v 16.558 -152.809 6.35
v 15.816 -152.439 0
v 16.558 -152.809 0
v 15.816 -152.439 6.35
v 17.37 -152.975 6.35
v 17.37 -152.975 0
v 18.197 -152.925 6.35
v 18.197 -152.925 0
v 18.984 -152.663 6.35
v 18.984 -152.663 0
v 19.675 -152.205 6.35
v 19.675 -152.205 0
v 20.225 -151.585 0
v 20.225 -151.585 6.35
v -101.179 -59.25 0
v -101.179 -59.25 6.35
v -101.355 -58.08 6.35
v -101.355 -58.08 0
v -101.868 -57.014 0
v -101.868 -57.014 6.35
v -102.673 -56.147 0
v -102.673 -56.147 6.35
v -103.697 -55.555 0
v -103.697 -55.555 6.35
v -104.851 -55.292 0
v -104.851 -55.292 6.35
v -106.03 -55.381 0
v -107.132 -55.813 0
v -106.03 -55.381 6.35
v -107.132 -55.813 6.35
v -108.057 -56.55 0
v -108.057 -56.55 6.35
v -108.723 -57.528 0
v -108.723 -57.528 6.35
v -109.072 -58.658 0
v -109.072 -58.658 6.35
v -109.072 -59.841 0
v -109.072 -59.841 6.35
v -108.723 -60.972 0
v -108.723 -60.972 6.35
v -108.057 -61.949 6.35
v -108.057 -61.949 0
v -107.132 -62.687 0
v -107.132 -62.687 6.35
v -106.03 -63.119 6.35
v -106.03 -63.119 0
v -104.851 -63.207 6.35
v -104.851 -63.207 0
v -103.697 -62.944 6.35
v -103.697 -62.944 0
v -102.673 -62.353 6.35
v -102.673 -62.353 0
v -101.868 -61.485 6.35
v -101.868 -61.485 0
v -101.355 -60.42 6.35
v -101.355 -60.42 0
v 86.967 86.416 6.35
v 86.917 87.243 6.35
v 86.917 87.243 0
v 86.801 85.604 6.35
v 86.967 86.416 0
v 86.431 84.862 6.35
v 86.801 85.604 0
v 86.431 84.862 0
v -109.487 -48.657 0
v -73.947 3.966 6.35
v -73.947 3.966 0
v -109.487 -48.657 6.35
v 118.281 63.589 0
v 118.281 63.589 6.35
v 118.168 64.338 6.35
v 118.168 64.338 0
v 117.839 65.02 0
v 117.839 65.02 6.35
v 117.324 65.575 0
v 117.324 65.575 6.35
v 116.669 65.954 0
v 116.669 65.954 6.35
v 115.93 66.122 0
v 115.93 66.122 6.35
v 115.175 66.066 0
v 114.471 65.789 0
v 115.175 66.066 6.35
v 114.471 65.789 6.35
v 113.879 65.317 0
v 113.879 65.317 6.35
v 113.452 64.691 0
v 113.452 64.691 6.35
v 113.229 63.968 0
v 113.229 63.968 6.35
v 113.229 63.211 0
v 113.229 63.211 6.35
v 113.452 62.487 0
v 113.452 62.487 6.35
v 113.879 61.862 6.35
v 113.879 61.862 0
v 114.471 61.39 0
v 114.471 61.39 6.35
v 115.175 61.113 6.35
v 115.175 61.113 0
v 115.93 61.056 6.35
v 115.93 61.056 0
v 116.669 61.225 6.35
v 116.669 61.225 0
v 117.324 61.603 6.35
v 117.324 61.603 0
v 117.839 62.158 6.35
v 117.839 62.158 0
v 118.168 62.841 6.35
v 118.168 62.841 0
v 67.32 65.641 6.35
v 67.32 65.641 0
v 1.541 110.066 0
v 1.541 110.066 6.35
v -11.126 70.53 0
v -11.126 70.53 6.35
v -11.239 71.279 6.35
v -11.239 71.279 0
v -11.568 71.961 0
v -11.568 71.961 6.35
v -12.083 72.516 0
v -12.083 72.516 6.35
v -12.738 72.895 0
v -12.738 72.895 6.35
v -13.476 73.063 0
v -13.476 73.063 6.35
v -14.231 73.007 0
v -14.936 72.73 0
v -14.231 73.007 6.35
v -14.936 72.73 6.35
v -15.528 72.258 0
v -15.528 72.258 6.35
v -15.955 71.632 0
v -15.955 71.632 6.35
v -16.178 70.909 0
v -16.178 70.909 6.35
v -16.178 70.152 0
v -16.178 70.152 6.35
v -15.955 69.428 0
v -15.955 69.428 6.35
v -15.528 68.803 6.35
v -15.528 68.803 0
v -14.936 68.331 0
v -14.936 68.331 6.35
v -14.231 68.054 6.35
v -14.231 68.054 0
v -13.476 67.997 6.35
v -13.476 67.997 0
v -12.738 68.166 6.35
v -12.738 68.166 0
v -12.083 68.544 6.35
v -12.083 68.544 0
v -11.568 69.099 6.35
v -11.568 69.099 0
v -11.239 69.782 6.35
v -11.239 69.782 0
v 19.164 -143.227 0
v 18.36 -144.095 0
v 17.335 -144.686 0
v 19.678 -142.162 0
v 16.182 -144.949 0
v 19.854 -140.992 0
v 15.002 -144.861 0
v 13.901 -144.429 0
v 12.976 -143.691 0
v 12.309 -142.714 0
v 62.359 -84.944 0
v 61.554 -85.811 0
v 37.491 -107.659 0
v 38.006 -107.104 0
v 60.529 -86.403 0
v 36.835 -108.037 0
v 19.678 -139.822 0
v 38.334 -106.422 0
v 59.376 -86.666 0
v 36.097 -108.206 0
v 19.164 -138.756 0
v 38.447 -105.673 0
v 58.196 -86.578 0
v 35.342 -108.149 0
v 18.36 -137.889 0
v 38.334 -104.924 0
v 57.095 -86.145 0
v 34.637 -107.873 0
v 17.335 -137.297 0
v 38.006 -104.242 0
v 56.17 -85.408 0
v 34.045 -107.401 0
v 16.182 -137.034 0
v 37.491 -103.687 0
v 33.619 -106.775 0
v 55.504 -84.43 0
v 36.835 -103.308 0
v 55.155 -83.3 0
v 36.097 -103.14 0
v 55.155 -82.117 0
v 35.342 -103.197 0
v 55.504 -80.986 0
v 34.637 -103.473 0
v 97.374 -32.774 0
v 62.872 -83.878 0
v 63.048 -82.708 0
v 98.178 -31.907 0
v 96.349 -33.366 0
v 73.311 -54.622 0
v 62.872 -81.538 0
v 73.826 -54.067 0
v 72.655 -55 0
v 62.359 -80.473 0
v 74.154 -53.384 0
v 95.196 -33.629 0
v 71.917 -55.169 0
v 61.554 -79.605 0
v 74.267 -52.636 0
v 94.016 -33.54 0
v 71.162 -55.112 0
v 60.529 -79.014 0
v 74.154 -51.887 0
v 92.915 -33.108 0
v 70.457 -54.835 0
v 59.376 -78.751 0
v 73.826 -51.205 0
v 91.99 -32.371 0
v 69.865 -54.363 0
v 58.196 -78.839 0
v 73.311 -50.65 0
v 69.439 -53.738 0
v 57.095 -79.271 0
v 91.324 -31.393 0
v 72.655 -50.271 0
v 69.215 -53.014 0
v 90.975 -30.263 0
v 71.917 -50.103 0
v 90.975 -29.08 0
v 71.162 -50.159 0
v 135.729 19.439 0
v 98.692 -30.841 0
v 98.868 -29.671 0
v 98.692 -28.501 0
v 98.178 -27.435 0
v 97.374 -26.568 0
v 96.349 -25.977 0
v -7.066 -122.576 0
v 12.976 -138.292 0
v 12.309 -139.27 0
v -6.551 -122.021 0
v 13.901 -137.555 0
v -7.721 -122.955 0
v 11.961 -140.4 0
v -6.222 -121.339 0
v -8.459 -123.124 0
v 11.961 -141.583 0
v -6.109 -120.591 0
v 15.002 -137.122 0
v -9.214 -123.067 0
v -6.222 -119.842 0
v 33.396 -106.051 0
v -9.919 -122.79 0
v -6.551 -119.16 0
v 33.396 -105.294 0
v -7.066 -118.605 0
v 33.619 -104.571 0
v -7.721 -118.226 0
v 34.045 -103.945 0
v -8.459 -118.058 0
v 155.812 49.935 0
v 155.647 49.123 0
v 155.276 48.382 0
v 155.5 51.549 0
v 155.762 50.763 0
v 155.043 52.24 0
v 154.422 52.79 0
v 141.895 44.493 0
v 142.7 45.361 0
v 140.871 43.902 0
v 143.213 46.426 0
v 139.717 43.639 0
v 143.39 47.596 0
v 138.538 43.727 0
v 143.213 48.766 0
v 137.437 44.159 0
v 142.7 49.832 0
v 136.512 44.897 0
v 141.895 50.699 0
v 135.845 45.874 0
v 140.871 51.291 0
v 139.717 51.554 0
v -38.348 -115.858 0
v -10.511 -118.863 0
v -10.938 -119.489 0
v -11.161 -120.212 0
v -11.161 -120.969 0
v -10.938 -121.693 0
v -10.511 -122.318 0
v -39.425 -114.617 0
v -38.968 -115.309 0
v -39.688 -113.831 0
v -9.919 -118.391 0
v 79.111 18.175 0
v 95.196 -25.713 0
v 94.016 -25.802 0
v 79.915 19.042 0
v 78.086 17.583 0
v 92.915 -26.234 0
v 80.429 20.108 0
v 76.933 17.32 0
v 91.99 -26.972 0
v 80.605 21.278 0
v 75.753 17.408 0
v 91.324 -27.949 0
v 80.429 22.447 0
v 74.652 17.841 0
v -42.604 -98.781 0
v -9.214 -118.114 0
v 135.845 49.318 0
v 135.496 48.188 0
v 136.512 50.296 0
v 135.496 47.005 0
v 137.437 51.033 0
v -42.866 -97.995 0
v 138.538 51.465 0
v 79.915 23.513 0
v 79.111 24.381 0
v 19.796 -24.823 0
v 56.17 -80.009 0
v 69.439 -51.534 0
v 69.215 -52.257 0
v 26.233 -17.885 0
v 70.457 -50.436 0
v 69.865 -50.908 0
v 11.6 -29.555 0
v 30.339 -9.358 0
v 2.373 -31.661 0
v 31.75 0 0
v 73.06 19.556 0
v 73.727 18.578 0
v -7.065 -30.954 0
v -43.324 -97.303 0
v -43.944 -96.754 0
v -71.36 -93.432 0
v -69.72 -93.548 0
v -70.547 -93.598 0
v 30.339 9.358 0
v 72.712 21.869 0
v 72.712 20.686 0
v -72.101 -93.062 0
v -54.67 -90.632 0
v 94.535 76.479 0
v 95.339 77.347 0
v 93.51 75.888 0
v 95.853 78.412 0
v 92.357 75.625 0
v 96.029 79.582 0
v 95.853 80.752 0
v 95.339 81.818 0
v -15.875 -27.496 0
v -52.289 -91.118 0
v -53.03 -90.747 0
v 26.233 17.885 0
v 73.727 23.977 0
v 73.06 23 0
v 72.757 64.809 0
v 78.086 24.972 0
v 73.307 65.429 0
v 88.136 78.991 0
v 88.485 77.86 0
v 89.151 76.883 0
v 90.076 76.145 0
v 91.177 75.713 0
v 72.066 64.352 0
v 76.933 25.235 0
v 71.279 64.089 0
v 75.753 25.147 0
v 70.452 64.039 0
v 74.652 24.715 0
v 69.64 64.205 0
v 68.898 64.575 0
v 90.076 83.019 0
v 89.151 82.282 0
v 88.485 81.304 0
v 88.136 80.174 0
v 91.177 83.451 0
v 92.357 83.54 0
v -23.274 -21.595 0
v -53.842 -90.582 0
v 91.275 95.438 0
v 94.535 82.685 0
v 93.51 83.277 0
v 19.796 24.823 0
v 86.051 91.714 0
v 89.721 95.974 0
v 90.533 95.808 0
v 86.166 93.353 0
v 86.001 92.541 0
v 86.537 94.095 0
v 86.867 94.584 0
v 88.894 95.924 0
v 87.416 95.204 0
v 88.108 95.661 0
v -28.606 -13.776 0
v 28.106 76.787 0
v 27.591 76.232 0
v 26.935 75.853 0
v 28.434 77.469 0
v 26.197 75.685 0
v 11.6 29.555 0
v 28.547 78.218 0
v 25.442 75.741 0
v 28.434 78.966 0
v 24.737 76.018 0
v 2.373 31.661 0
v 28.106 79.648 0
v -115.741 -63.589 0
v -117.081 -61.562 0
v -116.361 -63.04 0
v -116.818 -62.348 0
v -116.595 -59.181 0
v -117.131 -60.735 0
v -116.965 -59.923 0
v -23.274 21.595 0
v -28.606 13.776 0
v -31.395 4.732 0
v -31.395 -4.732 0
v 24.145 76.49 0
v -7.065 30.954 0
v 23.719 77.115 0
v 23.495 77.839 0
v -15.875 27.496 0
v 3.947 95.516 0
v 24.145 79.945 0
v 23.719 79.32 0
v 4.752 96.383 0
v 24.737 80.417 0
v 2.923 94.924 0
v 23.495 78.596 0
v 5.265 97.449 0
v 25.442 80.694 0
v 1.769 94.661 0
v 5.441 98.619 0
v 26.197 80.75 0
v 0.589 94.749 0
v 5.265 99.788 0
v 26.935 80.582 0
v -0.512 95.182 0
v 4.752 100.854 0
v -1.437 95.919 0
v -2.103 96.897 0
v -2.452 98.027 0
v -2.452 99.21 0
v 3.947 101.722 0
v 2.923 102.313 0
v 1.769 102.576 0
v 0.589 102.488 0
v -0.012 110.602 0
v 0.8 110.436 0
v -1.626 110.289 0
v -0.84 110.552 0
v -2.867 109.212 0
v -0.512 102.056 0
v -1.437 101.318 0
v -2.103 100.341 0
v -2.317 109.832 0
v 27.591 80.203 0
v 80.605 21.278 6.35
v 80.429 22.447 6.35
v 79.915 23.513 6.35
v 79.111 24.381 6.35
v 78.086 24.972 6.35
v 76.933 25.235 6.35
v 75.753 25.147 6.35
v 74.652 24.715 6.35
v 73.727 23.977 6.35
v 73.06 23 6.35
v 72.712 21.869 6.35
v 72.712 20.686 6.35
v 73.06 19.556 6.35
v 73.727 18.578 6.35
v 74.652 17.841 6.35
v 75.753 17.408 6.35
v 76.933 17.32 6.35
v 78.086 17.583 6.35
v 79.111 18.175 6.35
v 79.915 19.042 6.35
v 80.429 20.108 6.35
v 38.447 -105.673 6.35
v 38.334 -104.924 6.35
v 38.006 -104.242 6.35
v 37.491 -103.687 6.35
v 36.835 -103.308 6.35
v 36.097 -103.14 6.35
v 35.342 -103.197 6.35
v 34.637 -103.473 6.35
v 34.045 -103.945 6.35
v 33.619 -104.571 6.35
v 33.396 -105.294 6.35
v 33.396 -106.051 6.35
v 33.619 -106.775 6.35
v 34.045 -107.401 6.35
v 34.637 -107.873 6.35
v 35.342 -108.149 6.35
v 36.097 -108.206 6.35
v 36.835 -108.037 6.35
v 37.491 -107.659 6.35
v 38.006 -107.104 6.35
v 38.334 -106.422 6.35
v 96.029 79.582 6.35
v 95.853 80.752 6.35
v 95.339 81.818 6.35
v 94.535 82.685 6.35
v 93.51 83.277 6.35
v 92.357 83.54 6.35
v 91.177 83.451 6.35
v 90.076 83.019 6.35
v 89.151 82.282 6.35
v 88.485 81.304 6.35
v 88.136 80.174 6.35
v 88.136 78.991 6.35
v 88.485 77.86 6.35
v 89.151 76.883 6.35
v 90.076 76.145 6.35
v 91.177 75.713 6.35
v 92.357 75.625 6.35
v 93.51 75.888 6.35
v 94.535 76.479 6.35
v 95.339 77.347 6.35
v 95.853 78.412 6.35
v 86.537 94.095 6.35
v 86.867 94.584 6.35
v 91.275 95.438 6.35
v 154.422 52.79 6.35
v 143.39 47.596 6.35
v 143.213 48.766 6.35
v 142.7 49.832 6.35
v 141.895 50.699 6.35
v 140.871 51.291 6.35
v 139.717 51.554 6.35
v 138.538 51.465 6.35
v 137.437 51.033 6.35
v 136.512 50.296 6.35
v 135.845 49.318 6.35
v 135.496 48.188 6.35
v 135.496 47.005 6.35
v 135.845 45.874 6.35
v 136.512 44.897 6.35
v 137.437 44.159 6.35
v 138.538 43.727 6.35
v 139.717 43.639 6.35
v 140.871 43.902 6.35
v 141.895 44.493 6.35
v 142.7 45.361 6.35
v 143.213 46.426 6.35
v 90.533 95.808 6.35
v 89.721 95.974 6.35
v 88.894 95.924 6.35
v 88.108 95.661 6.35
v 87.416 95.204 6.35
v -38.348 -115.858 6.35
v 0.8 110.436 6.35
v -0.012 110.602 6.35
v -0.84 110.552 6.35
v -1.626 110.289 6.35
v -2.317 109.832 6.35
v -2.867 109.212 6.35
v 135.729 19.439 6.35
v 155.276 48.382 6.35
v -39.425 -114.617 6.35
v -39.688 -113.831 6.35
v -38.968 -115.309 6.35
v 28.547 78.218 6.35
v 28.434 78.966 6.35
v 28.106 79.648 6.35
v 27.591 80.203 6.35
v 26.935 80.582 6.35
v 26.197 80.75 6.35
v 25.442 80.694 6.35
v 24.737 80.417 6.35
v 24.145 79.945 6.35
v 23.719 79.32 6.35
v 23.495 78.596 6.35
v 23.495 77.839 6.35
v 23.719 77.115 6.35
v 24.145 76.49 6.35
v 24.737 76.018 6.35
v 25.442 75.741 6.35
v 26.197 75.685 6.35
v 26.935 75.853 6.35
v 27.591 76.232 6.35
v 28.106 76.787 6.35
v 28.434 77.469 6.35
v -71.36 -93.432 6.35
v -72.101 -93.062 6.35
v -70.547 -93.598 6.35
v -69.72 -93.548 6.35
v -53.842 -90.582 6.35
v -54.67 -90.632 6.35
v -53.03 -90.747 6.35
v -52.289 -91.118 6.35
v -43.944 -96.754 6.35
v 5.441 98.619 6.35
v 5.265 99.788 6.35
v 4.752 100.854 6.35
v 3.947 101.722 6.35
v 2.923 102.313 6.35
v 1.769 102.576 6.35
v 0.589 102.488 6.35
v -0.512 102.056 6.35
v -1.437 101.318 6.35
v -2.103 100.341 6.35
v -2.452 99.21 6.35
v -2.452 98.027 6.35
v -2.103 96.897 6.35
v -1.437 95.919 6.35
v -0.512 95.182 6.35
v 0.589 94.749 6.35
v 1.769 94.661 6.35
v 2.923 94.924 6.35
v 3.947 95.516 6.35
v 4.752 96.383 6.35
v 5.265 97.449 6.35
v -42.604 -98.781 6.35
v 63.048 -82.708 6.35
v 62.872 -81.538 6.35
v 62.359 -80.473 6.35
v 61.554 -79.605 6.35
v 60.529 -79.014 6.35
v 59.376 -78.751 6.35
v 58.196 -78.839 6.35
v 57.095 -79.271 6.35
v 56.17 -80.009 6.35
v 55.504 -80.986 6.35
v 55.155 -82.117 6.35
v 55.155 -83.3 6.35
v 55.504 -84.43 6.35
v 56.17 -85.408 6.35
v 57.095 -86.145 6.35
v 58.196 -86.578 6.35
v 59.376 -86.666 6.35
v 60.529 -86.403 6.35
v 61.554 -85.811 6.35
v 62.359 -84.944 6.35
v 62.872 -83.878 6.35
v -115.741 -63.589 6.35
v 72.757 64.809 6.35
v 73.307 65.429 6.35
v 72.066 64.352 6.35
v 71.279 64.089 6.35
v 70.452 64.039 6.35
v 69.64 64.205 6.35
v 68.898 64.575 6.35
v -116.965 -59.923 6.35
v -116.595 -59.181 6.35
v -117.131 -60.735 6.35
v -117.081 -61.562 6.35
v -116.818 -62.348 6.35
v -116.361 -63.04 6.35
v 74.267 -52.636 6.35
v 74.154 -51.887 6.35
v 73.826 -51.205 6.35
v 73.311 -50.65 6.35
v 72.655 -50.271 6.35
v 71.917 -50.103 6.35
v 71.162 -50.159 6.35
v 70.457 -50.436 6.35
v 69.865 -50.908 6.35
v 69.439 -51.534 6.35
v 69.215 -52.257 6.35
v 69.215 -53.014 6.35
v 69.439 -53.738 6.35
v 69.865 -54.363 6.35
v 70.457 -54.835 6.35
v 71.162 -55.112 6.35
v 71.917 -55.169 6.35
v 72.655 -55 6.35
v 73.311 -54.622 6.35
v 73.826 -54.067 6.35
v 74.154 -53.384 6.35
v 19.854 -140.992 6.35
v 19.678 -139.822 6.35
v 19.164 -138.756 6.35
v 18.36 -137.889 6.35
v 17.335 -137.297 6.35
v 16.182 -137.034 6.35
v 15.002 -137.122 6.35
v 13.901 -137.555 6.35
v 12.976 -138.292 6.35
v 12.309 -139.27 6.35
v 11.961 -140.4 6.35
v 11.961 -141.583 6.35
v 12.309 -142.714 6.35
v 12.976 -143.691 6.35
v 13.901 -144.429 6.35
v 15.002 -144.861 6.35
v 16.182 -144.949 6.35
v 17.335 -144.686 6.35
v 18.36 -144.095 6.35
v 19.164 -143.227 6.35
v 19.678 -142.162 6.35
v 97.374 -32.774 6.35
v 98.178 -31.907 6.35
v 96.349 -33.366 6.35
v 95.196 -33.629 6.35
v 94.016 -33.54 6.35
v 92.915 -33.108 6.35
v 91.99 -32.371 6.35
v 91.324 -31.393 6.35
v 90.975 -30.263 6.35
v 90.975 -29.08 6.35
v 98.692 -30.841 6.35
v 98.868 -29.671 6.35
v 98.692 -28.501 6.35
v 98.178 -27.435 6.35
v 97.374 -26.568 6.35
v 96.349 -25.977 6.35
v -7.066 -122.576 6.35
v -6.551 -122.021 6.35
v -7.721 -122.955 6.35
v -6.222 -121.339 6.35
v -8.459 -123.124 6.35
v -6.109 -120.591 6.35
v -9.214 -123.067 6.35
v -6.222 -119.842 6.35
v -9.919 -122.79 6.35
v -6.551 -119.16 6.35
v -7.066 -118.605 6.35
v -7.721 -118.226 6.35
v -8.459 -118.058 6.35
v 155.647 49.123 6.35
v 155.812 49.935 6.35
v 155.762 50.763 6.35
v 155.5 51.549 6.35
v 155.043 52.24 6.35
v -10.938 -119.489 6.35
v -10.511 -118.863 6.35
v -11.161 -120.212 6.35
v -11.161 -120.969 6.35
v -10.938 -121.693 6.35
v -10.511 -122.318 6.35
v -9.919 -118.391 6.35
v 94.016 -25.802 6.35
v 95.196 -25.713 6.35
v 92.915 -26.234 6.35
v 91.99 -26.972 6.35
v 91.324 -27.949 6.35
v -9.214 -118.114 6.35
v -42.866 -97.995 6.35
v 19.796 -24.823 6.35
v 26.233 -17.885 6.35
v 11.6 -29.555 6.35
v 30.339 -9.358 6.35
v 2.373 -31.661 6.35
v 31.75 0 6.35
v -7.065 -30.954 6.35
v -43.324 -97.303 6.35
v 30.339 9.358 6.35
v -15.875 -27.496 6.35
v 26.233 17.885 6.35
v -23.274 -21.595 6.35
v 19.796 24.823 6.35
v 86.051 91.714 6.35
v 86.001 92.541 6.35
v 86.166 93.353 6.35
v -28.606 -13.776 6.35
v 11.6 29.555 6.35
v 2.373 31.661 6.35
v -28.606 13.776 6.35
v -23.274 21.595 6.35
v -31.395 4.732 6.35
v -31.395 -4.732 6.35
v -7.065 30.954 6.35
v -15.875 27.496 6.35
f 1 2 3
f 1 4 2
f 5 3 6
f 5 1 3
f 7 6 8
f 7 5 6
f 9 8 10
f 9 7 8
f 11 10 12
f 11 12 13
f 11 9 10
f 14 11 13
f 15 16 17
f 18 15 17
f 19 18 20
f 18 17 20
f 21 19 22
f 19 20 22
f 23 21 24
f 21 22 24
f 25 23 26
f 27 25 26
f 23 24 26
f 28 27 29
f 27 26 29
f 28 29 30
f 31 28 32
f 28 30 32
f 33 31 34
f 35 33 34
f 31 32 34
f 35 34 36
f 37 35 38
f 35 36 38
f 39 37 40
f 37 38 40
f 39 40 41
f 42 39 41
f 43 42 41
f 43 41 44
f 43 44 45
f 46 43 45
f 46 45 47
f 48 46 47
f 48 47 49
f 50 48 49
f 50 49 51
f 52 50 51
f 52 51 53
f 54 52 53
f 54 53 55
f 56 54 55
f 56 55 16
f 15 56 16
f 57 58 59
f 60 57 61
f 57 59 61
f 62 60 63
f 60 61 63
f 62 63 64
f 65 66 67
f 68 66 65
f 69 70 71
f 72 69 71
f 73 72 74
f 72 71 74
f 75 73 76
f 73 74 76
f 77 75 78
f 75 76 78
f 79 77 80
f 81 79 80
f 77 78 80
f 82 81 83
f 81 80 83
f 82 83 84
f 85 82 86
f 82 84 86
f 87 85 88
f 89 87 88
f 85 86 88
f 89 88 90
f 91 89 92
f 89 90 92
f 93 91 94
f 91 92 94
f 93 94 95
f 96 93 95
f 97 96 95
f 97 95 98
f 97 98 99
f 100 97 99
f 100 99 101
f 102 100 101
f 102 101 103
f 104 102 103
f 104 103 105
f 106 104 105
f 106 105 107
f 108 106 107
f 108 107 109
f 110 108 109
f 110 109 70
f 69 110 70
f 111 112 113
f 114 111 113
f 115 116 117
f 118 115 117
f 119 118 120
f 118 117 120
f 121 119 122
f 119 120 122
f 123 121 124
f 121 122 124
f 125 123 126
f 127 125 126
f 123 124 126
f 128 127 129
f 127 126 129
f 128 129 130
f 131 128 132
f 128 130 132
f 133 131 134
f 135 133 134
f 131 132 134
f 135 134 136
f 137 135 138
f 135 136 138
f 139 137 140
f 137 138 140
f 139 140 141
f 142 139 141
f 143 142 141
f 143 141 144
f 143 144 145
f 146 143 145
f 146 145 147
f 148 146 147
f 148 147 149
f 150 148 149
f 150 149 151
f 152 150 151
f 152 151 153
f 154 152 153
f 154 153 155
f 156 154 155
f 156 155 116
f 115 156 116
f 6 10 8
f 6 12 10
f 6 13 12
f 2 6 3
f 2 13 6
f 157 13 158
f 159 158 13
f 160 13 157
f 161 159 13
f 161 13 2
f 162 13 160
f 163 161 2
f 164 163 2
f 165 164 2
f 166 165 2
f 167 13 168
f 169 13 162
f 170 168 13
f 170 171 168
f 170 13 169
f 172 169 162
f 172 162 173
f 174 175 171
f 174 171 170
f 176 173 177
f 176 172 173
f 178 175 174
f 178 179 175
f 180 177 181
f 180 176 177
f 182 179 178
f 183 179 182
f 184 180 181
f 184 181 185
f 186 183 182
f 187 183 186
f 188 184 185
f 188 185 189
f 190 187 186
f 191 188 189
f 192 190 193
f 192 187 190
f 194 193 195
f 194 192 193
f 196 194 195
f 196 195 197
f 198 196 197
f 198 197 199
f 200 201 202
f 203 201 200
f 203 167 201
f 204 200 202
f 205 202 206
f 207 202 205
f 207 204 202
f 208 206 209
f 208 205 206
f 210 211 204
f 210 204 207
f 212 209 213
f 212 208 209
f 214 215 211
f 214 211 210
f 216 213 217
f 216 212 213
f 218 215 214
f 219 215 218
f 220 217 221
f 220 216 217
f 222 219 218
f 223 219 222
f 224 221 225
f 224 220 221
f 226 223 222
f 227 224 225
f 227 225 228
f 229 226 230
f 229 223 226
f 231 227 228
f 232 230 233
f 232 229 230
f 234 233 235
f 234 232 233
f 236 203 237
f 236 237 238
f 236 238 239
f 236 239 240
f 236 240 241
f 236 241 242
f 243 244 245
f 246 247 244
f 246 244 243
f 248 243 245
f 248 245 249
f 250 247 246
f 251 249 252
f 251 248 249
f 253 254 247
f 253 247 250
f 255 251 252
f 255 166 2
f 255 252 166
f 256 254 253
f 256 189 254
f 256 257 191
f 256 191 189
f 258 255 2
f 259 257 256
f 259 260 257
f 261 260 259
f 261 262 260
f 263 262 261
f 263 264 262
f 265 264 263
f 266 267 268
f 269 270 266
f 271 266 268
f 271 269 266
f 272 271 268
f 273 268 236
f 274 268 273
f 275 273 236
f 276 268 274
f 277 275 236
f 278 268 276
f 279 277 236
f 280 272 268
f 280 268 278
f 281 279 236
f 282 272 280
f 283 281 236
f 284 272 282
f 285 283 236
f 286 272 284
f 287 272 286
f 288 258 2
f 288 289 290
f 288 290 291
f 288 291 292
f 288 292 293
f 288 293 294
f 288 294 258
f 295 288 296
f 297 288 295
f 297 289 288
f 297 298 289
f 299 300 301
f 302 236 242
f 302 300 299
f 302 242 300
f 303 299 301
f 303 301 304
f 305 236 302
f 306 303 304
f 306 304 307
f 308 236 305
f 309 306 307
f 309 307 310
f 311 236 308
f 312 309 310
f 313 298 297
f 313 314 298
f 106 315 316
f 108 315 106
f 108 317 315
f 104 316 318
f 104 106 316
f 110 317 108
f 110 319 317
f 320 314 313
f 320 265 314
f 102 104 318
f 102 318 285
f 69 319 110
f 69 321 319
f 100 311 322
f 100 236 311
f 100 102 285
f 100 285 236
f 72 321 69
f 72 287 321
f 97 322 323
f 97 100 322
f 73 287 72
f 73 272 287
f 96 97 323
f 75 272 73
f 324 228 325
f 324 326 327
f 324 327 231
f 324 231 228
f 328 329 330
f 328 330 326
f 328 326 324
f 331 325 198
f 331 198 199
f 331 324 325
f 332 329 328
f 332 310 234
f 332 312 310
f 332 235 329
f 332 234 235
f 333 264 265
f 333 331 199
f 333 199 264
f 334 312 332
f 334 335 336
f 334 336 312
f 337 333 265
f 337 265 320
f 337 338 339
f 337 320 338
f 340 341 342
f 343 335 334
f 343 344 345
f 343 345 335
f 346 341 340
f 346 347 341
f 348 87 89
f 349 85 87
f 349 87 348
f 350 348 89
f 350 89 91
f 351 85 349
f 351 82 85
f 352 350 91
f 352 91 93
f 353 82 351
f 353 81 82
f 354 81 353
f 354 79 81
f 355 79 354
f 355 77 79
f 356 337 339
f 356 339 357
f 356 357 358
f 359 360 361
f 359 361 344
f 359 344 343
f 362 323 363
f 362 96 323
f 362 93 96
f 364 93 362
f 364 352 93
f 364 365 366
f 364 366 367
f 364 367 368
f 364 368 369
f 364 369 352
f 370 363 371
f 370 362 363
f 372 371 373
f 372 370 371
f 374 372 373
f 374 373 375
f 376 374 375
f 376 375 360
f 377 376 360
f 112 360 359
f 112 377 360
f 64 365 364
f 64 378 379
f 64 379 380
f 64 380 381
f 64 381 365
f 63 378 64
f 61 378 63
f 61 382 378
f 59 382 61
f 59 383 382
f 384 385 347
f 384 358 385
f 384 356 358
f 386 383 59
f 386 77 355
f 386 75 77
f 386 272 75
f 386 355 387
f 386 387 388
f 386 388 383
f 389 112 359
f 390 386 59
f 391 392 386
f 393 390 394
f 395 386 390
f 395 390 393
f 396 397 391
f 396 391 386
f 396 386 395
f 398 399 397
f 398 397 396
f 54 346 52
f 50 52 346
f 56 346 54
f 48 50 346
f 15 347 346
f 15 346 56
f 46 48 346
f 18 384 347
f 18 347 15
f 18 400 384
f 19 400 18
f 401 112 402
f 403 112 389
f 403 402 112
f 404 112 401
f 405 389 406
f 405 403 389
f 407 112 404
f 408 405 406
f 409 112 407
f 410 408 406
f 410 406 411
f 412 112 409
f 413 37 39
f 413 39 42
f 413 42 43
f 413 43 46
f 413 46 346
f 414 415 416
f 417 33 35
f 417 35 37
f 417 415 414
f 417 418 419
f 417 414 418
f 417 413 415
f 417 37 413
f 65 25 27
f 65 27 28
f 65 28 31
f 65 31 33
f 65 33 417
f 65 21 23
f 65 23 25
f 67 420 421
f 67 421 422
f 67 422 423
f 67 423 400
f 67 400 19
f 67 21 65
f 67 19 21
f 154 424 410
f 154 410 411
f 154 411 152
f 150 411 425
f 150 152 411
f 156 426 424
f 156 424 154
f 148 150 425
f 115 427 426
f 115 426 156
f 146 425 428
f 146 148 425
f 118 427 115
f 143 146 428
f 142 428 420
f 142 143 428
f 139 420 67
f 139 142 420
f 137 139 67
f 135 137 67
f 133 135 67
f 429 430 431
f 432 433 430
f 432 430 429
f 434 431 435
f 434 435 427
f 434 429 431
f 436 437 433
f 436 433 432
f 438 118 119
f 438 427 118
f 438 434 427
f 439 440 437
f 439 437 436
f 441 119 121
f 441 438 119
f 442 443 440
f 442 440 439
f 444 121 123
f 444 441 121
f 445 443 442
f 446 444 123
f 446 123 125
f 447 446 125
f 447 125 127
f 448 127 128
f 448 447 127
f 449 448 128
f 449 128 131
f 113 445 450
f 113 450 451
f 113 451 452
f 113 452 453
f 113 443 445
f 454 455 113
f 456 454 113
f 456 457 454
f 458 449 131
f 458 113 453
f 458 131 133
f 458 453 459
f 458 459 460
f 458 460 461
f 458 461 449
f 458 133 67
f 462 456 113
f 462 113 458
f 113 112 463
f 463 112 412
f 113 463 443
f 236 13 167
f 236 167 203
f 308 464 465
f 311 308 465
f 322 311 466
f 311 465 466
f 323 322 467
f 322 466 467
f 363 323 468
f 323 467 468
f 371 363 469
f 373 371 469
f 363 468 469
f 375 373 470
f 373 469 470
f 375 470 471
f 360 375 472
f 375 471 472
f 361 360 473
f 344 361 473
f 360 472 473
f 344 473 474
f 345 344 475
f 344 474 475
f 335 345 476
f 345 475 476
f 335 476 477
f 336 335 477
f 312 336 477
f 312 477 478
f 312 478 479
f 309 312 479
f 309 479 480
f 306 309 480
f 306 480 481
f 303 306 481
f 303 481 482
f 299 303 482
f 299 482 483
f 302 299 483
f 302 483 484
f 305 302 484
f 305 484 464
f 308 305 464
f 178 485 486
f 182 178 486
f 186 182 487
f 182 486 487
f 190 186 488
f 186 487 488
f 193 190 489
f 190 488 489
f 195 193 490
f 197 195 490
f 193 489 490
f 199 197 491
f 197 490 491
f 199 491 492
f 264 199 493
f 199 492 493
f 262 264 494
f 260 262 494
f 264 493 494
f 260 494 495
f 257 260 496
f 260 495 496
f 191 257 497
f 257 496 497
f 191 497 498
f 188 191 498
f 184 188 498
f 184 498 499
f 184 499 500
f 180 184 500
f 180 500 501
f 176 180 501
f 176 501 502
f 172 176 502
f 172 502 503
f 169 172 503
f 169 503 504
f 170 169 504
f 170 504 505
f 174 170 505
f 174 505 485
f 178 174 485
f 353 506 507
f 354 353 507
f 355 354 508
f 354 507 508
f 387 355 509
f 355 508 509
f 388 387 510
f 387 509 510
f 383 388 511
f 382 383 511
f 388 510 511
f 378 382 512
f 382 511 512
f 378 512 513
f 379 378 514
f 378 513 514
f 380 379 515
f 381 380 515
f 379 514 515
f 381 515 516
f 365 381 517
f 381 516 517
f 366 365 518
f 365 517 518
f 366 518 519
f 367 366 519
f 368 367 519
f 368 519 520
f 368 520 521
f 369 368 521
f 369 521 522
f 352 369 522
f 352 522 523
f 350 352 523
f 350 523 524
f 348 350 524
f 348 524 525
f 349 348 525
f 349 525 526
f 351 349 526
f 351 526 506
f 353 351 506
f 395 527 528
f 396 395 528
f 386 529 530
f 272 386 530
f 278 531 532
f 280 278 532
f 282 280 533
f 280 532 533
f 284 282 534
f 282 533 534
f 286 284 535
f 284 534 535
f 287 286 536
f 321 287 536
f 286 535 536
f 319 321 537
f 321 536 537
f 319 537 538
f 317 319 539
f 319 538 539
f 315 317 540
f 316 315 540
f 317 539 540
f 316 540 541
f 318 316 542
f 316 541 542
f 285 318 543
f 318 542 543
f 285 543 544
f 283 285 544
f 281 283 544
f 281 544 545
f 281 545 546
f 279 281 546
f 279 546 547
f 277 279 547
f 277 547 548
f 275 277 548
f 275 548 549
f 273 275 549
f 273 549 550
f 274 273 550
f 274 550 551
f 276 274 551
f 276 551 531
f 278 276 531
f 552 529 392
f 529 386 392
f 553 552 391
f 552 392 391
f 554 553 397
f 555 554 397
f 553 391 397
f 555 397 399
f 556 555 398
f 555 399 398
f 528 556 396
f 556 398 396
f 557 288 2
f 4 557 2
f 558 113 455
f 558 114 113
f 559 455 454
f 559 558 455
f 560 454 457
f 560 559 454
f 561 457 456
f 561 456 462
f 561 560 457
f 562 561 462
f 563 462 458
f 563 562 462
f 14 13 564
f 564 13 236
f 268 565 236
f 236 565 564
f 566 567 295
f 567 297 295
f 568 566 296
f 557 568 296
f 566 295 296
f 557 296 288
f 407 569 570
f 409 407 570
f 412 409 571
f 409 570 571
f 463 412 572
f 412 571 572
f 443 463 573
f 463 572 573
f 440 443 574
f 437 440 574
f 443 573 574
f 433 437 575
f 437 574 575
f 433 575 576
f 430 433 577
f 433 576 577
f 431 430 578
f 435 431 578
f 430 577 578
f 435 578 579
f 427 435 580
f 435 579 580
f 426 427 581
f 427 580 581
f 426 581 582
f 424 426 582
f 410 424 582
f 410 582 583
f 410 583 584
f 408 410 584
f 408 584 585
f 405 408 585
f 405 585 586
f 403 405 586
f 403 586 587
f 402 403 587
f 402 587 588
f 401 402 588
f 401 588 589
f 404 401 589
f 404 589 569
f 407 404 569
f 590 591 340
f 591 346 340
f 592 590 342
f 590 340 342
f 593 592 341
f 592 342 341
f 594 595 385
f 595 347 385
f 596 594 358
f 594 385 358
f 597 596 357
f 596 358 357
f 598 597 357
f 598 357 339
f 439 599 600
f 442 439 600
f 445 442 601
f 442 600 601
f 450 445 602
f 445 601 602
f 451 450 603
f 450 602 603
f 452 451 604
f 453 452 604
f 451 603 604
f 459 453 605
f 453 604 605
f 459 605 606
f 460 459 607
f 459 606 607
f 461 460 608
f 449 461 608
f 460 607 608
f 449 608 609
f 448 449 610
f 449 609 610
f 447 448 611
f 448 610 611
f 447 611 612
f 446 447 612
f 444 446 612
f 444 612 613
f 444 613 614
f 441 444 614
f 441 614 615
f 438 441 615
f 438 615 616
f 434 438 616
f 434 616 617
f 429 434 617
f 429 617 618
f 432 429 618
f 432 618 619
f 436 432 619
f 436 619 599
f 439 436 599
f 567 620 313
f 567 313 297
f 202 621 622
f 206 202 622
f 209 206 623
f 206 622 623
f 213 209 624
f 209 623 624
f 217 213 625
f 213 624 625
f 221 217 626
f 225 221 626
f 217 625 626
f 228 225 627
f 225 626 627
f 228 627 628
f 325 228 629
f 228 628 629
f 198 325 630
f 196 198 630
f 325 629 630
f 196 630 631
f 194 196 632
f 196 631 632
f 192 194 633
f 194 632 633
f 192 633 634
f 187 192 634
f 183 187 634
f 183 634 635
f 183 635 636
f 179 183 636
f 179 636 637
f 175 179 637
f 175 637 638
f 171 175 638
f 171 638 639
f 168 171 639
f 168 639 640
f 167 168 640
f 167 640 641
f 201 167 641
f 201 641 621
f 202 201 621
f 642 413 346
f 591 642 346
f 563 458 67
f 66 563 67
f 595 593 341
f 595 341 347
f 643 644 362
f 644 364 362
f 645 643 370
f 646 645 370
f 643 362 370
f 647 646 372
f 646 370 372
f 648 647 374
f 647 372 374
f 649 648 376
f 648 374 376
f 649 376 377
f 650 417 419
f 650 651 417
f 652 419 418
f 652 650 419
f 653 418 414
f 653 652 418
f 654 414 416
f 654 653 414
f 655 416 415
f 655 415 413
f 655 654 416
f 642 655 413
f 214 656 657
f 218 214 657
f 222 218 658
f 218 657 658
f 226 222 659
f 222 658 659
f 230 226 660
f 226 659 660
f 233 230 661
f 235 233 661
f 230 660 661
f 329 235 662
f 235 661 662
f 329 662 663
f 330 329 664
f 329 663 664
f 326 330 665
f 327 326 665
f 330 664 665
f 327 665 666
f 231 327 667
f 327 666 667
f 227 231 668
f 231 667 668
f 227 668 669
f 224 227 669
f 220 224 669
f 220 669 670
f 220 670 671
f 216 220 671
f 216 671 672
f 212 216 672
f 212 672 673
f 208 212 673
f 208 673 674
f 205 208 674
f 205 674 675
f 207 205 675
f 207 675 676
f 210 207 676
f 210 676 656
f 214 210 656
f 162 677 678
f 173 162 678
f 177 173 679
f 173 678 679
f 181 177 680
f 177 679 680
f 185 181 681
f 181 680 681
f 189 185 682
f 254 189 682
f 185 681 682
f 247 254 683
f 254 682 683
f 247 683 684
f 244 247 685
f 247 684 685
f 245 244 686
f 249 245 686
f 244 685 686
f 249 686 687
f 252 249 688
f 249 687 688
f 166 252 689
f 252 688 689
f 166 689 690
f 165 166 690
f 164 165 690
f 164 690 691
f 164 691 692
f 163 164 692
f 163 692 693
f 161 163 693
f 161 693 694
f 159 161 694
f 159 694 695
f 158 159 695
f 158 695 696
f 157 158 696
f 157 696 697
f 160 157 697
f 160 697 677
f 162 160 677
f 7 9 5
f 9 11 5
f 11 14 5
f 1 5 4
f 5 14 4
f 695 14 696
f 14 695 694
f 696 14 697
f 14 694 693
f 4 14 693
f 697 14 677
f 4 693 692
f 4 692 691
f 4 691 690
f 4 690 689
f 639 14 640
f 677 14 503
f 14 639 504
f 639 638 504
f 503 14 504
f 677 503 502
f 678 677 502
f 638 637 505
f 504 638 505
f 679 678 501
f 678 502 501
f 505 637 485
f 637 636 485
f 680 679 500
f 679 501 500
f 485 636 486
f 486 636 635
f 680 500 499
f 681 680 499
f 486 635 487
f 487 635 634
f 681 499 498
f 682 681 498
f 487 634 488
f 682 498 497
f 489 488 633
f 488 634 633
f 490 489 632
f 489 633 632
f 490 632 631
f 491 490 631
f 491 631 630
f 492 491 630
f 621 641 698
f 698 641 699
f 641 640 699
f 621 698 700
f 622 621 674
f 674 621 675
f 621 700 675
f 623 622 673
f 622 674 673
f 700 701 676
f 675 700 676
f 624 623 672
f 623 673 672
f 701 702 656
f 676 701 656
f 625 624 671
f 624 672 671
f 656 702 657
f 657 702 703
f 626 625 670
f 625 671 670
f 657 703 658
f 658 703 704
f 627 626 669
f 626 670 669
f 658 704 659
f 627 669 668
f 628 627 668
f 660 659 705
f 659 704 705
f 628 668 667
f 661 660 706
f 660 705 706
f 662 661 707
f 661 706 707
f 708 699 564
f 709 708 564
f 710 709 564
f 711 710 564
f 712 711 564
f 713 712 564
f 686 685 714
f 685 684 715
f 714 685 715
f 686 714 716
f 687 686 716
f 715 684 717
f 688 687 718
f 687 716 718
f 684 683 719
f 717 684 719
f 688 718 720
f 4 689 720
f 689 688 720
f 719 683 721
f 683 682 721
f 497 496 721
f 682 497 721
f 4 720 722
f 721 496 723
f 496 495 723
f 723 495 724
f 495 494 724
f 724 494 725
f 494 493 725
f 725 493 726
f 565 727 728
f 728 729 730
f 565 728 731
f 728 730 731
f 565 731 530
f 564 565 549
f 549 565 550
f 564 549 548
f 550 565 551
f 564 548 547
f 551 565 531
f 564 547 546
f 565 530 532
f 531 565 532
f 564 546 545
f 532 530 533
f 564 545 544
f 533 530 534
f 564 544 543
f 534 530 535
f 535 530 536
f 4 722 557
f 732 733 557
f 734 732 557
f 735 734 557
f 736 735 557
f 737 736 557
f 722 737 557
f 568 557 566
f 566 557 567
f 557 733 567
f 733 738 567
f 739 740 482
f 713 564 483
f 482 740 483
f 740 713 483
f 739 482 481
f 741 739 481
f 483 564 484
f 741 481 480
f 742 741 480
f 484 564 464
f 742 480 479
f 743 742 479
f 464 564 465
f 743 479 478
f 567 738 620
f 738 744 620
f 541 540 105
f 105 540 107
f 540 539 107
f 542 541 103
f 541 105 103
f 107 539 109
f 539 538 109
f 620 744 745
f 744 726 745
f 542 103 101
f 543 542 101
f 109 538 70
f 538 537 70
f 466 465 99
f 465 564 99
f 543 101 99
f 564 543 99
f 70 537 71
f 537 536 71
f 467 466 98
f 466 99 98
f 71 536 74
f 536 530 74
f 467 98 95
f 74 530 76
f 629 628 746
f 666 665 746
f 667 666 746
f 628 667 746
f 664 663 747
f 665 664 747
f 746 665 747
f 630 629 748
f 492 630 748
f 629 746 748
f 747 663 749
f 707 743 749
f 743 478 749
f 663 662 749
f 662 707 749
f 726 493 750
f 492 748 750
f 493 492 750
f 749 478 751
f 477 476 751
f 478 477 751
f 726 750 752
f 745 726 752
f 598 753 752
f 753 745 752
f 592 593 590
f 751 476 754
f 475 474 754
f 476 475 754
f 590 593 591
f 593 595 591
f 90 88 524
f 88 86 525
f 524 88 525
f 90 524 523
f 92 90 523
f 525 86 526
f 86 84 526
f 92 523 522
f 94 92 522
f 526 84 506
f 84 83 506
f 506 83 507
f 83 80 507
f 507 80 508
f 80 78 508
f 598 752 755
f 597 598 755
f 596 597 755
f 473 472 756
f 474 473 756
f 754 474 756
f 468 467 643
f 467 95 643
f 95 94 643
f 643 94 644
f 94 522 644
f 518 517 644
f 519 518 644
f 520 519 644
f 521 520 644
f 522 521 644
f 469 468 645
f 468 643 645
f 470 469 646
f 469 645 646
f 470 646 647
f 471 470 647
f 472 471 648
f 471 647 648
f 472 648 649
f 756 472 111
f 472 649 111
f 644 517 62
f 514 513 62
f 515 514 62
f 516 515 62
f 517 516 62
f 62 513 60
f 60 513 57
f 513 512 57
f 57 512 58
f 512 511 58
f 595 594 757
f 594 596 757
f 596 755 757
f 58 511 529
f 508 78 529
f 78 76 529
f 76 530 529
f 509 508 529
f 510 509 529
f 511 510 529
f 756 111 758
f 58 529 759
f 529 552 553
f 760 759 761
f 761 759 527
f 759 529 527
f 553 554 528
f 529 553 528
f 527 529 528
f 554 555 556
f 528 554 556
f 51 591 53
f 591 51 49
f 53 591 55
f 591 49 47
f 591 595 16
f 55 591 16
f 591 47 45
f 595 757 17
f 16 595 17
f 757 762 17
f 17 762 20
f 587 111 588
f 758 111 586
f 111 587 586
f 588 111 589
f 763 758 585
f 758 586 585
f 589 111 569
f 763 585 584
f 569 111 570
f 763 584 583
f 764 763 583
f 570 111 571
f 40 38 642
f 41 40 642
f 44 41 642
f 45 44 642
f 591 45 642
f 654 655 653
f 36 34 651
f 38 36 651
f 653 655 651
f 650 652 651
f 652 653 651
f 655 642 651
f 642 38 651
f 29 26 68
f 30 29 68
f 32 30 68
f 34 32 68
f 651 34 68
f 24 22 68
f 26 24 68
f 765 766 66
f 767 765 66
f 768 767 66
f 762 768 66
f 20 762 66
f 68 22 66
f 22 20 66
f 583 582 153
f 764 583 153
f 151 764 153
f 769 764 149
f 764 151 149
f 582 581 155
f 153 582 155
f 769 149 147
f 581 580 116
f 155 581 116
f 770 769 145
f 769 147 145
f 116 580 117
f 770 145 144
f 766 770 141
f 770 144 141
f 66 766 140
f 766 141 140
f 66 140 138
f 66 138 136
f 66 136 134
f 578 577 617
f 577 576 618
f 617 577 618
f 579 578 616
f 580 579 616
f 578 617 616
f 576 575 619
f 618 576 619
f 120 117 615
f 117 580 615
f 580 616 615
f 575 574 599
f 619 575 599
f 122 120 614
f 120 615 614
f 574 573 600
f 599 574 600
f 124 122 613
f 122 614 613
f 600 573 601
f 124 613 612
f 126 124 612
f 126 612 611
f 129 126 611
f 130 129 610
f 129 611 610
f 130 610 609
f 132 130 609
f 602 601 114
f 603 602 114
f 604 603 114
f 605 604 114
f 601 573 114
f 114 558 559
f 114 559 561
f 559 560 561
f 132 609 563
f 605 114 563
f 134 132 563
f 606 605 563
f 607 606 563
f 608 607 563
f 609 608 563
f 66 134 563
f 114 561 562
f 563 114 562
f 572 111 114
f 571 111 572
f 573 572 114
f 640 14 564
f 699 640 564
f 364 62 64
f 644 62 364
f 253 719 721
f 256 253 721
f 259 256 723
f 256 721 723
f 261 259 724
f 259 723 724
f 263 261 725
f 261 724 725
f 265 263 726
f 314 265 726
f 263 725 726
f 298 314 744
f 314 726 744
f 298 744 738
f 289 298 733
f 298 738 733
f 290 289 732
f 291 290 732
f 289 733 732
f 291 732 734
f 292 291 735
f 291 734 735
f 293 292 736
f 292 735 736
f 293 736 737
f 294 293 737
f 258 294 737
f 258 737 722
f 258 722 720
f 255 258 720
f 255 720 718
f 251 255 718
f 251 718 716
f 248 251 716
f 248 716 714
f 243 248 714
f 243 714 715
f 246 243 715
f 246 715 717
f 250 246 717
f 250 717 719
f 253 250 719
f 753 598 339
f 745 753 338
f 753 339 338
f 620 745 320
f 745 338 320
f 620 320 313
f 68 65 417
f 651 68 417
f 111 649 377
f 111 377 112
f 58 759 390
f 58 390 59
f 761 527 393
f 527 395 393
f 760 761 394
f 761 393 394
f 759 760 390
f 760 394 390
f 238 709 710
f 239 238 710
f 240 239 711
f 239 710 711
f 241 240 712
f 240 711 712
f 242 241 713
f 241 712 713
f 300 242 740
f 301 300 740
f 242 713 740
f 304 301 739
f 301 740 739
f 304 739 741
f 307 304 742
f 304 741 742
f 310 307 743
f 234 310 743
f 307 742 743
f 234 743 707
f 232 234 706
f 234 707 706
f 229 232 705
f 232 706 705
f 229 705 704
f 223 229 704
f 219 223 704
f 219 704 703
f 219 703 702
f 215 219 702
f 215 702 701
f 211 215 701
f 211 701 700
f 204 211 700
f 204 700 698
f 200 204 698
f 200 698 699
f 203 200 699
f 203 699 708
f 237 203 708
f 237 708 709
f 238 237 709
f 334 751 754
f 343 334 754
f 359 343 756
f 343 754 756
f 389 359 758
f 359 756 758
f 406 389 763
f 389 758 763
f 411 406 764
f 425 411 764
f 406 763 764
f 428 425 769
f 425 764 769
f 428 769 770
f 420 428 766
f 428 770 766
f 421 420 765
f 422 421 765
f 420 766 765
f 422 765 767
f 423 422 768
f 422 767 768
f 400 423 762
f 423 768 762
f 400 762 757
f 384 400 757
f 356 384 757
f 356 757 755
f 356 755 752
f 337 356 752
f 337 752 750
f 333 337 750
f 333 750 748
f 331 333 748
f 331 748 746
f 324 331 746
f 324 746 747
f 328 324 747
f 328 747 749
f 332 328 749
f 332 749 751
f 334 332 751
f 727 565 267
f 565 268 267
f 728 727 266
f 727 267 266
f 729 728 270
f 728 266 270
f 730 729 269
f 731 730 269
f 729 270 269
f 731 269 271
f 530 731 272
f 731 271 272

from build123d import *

# Parameters (mm, degrees)
BOSS_EXTRUDE2_DEPTH = 6.35
CUT_EXTRUDE1_DEPTH  = 7.3500001
BOSS_EXTRUDE3_DEPTH = 6.35
SKETCH10_R          = 3.96875
CUT_EXTRUDE2_DEPTH  = 7.35
SKETCH11_R          = 4.5
CUT_EXTRUDE4_DEPTH  = 7.35
BOSS_EXTRUDE4_DEPTH = 6.35
SKETCH13_R          = 3.96875
CUT_EXTRUDE5_DEPTH  = 7.35
LPATTERN1_COUNT     = 2
LPATTERN1_PITCH     = 64
SKETCH14_R          = 2.54
CUT_EXTRUDE6_DEPTH  = 7.35
SKETCH15_R          = 3.96875
CUT_EXTRUDE7_DEPTH  = 7.35
SKETCH16_R          = 3.96875
CUT_EXTRUDE8_DEPTH  = 7.35
SKETCH19_R          = 3.96875
CUT_EXTRUDE11_DEPTH = 7.35
SKETCH21_R          = 2.54
CUT_EXTRUDE12_DEPTH = 7.35
SKETCH22_R          = 31.75
CUT_EXTRUDE13_DEPTH = 7.35
SKETCH23_R          = 5.807663874
SKETCH23_R_2        = 5.610358505
BOSS_EXTRUDE5_DEPTH = 6.35
SKETCH24_R          = 10.761293976
SKETCH24_R_2        = 16.881729782
SKETCH24_R_3        = 7.918988805
BOSS_EXTRUDE6_DEPTH = 6.35
CUT_EXTRUDE14_DEPTH = 7.35
FILLET1_R           = 3.175


with BuildPart() as part:
    # Sketch6 → Boss-Extrude2 (new body)
    with BuildSketch(Plane.XY):
        with BuildLine():
            Line((-68.006850091, -76.67090114), (-109.486767671, -48.656527855))
            Line((-109.486767671, -48.656527855), (-118.371760678, -61.812230963))
            Line((-118.371760678, -61.812230963), (18.447551645, -154.216158235))
            Line((18.447551645, -154.216158235), (135.729459338, 19.43912279))
            Line((135.729459338, 19.43912279), (-1.089852986, 111.843050063))
            Line((-1.089852986, 111.843050063), (-73.946795643, 3.966284577))
            Line((-73.946795643, 3.966284577), (-56.624438948, -7.732749433))
            ThreePointArc((-56.624438948, -7.732749433), (-43.058385537, 37.577891571), (0, 57.15))
            ThreePointArc((0, 57.15), (56.404848571, 31.095576642), (70.829334649, -29.338471048))
            add(Edge.make_bspline(
                [(70.829334649, -29.338471048), (70.811686062, -29.418295928), (70.776015112, -29.578104383), (70.713320217, -29.85478305), (70.619021771, -30.262929245), (70.501052001, -30.762086912), (70.364034474, -31.322191481), (70.199318515, -31.970958926), (70.000453855, -32.723919765), (69.795103485, -33.469783355), (69.582015398, -34.214296028), (69.361377803, -34.956693289), (69.133257682, -35.696762218), (68.838782679, -36.61892651), (68.470566207, -37.720710028), (68.019498024, -38.998776477), (67.474836154, -40.448808619), (66.901337925, -41.887676852), (66.299328392, -43.31485223), (65.669141732, -44.729810424), (65.011119088, -46.132040323), (64.325609411, -47.52103904), (63.612968547, -48.896314904), (62.87355937, -50.257385735), (62.107751613, -51.603779381), (61.315921169, -52.935034173), (60.49845004, -54.250698756), (59.655726138, -55.550331897), (58.571247582, -57.154294757), (57.220953058, -59.045283389), (55.576035723, -61.200397094), (53.604026134, -63.590264702), (51.54329346, -65.904053004), (49.39728314, -68.138962994), (47.169496434, -70.29235602), (44.863486103, -72.361752995), (42.482847363, -74.344831806), (40.031215607, -76.239428526), (36.882516177, -78.494556171), (32.976808929, -81.016011003), (28.250788286, -83.68089187), (21.41551215, -86.919136497), (14.30829026, -89.526654921), (6.996956895, -91.488176442), (-0.451922312, -92.797413176), (-6.61686174, -93.456358442), (-12.81195397, -93.702029749), (-19.009644204, -93.537285056), (-25.183124422, -92.966685286), (-31.306438312, -91.996382122), (-36.598524037, -90.804323442), (-41.072542301, -89.543185606), (-44.752319298, -88.33589156), (-47.664184976, -87.27761875), (-50.541347258, -86.128353728), (-53.381128552, -84.889612663), (-56.180924218, -83.562977818), (-58.593536599, -82.326710176), (-60.633378351, -81.214215821), (-62.313751085, -80.252471782), (-63.646071553, -79.462491566), (-64.966093336, -78.652178853), (-66.222359154, -77.854259082), (-67.143044791, -77.250601571), (-67.736251212, -76.85365602), (-68.006850091, -76.67090114)],
                knots=[0.071020771, 0.071020771, 0.071020771, 0.071020771, 0.071020771, 0.072848477, 0.074676184, 0.07650389, 0.078331597, 0.08198701, 0.085642423, 0.089297836, 0.092953249, 0.096608662, 0.100264075, 0.103919488, 0.107574901, 0.114885727, 0.122196554, 0.12950738, 0.136818214, 0.144129048, 0.151439882, 0.158750716, 0.166061558, 0.173372401, 0.180683243, 0.187994085, 0.195304924, 0.202615763, 0.209926602, 0.217237441, 0.231859103, 0.246480766, 0.261102426, 0.275724085, 0.290345754, 0.304967424, 0.319589099, 0.334210774, 0.348832457, 0.36345414, 0.392697464, 0.421940789, 0.451184112, 0.506140643, 0.535383973, 0.564627303, 0.593870641, 0.623113979, 0.652357319, 0.68160066, 0.710843985, 0.740087309, 0.754708984, 0.769330659, 0.783952333, 0.798574008, 0.813195669, 0.82781733, 0.842438991, 0.849749821, 0.857060652, 0.86437149, 0.871682327, 0.878993165, 0.885158103, 0.885158103, 0.885158103, 0.885158103, 0.885158103], degree=4))
        make_face()
    extrude(amount=BOSS_EXTRUDE2_DEPTH)

    # Sketch8 → Cut-Extrude1 (cut, through all)
    with BuildSketch(Plane.XY.offset(6.35)):
        Polygon((-71.011229489, -93.798205788), (-53.378672597, -90.381637707), (-42.854110111, -97.489632113), (-39.43754203, -115.122189004), align=None)
    extrude(amount=-CUT_EXTRUDE1_DEPTH, mode=Mode.SUBTRACT)

    # Sketch9 → Boss-Extrude3 (add, through all)
    with BuildSketch(Plane.XY.offset(6.35)):
        Polygon((-1.089852986, 111.843050063), (-109.486767671, -48.656527855), (27.332544652, -141.060455127), (135.729459338, 19.43912279), align=None)
    extrude(amount=-BOSS_EXTRUDE3_DEPTH)

    # Sketch10 → Cut-Extrude2 (cut, through all)
    with BuildSketch(Plane.XY.offset(6.35)):
        with Locations((4.996496209, -84.796642912)):
            Circle(SKETCH10_R)
        with Locations((40.816310536, -31.759477627)):
            Circle(SKETCH10_R)
        with Locations((76.636124864, 21.277687659)):
            Circle(SKETCH10_R)
        with Locations((-45.295165913, -45.214466102)):
            Circle(SKETCH10_R)
    extrude(amount=-CUT_EXTRUDE2_DEPTH, mode=Mode.SUBTRACT)

    # Sketch11 → Cut-Extrude4 (cut, through all)
    with BuildSketch(Plane.XY.offset(6.35)):
        Circle(SKETCH11_R)
    extrude(amount=-CUT_EXTRUDE4_DEPTH, mode=Mode.SUBTRACT)

    # Sketch12 → Boss-Extrude4 (add, through all)
    with BuildSketch(Plane.XY.offset(6.35)):
        Polygon((135.729459338, 19.43912279), (67.319803176, 65.641086427), (88.643786393, 97.214773886), (157.053442554, 51.01281025), align=None)
    extrude(amount=-BOSS_EXTRUDE4_DEPTH)

    # Sketch13 → Cut-Extrude5 (cut, through all)
    with BuildSketch(Plane.XY.offset(6.35)):
        with Locations((94.899221836, -29.671127724)):
            Circle(SKETCH13_R)
    cut_extrude5 = extrude(amount=-CUT_EXTRUDE5_DEPTH, mode=Mode.SUBTRACT)

    # LPattern1: Cut-Extrude5 ×2
    with Locations(*[Vector(-0.559684599, -0.828705708, 0) * (i * LPATTERN1_PITCH) for i in range(1, LPATTERN1_COUNT)]):
        add(cut_extrude5, mode=Mode.SUBTRACT)

    # Sketch14 → Cut-Extrude6 (cut, through all)
    with BuildSketch(Plane.XY.offset(6.35)):
        with Locations((71.72703343, -52.635713164)):
            Circle(SKETCH14_R)
        with Locations((35.907219102, -105.67287845)):
            Circle(SKETCH14_R)
        with Locations((115.740620068, 63.589229581)):
            Circle(SKETCH14_R)
    extrude(amount=-CUT_EXTRUDE6_DEPTH, mode=Mode.SUBTRACT)

    # Sketch15 → Cut-Extrude7 (cut, through all)
    with BuildSketch(Plane.XY.offset(6.35)):
        with Locations((-105.147343009, -59.249804902)):
            Circle(SKETCH15_R)
        with Locations((15.885125585, -140.991740566)):
            Circle(SKETCH15_R)
        with Locations((1.472573075, 98.618632394)):
            Circle(SKETCH15_R)
    extrude(amount=-CUT_EXTRUDE7_DEPTH, mode=Mode.SUBTRACT)

    # Sketch16 → Cut-Extrude8 (cut, through all)
    with BuildSketch(Plane.XY.offset(6.35)):
        with Locations((92.060354474, 79.582216994)):
            Circle(SKETCH16_R)
        with Locations((139.420885662, 47.596242169)):
            Circle(SKETCH16_R)
    extrude(amount=-CUT_EXTRUDE8_DEPTH, mode=Mode.SUBTRACT)

    # Sketch19 → Cut-Extrude11 (cut, through all)
    with BuildSketch(Plane.XY.offset(6.35)):
        with Locations((-65.680233685, -85.904783923)):
            Circle(SKETCH19_R)
    extrude(amount=-CUT_EXTRUDE11_DEPTH, mode=Mode.SUBTRACT)

    # Sketch21 → Cut-Extrude12 (cut, through all)
    with BuildSketch(Plane.XY.offset(6.35)):
        with Locations((-13.666272317, 70.530227577)):
            Circle(SKETCH21_R)
        with Locations((26.00698069, 78.217505758)):
            Circle(SKETCH21_R)
        with Locations((-86.729358658, -71.688795112)):
            Circle(SKETCH21_R)
        with Locations((-8.64928203, -120.590613931)):
            Circle(SKETCH21_R)
    extrude(amount=-CUT_EXTRUDE12_DEPTH, mode=Mode.SUBTRACT)

    # Sketch22 → Cut-Extrude13 (cut, through all)
    with BuildSketch(Plane.XY.offset(6.35)):
        Circle(SKETCH22_R)
    extrude(amount=-CUT_EXTRUDE13_DEPTH, mode=Mode.SUBTRACT)

    # Sketch23 → Boss-Extrude5 (add, through all)
    with BuildSketch(Plane.XY.offset(6.35)):
        with Locations((-65.680233685, -85.904783923)):
            Circle(SKETCH23_R)
        with Locations((-86.729358658, -71.688795112)):
            Circle(SKETCH23_R_2)
    extrude(amount=-BOSS_EXTRUDE5_DEPTH)

    # Sketch24 → Boss-Extrude6 (add, through all)
    with BuildSketch(Plane.XY.offset(6.35)):
        with Locations((-45.295165913, -45.214466102)):
            Circle(SKETCH24_R)
        with Locations((4.996496209, -84.796642912)):
            Circle(SKETCH24_R_2)
        with Locations((40.816310536, -31.759477627)):
            Circle(SKETCH24_R_3)
    extrude(amount=-BOSS_EXTRUDE6_DEPTH)

    # Sketch25 → Cut-Extrude14 (cut, through all)
    with BuildSketch(Plane.XY.offset(6.35)):
        Polygon((85.800588631, 93.004948891), (87.167215863, 85.951926135), (71.529628171, 62.797888664), (67.319803176, 65.641086427), align=None)
    extrude(amount=-CUT_EXTRUDE14_DEPTH, mode=Mode.SUBTRACT)

    # Fillet1
    fillet1_edges = [part.edges().sort_by_distance(p)[0] for p in [
        (-1.089852986, 111.843050063, 3.175),
        (18.447551645, -154.216158235, 3.175),
        (-118.371760678, -61.812230963, 3.175),
        (85.800588631, 93.004948891, 3.175),
        (87.167215863, 85.951926135, 3.175),
        (71.529628171, 62.797888664, 3.175),
        (-39.43754203, -115.122189004, 3.175),
        (-71.011229489, -93.798205788, 3.175),
        (-53.378672597, -90.381637707, 3.175),
        (-42.854110111, -97.489632113, 3.175),
        (157.053442554, 51.01281025, 3.175),
        (88.643786393, 97.214773886, 3.175),
    ]]
    fillet(fillet1_edges, radius=FILLET1_R)


solid = part.part
